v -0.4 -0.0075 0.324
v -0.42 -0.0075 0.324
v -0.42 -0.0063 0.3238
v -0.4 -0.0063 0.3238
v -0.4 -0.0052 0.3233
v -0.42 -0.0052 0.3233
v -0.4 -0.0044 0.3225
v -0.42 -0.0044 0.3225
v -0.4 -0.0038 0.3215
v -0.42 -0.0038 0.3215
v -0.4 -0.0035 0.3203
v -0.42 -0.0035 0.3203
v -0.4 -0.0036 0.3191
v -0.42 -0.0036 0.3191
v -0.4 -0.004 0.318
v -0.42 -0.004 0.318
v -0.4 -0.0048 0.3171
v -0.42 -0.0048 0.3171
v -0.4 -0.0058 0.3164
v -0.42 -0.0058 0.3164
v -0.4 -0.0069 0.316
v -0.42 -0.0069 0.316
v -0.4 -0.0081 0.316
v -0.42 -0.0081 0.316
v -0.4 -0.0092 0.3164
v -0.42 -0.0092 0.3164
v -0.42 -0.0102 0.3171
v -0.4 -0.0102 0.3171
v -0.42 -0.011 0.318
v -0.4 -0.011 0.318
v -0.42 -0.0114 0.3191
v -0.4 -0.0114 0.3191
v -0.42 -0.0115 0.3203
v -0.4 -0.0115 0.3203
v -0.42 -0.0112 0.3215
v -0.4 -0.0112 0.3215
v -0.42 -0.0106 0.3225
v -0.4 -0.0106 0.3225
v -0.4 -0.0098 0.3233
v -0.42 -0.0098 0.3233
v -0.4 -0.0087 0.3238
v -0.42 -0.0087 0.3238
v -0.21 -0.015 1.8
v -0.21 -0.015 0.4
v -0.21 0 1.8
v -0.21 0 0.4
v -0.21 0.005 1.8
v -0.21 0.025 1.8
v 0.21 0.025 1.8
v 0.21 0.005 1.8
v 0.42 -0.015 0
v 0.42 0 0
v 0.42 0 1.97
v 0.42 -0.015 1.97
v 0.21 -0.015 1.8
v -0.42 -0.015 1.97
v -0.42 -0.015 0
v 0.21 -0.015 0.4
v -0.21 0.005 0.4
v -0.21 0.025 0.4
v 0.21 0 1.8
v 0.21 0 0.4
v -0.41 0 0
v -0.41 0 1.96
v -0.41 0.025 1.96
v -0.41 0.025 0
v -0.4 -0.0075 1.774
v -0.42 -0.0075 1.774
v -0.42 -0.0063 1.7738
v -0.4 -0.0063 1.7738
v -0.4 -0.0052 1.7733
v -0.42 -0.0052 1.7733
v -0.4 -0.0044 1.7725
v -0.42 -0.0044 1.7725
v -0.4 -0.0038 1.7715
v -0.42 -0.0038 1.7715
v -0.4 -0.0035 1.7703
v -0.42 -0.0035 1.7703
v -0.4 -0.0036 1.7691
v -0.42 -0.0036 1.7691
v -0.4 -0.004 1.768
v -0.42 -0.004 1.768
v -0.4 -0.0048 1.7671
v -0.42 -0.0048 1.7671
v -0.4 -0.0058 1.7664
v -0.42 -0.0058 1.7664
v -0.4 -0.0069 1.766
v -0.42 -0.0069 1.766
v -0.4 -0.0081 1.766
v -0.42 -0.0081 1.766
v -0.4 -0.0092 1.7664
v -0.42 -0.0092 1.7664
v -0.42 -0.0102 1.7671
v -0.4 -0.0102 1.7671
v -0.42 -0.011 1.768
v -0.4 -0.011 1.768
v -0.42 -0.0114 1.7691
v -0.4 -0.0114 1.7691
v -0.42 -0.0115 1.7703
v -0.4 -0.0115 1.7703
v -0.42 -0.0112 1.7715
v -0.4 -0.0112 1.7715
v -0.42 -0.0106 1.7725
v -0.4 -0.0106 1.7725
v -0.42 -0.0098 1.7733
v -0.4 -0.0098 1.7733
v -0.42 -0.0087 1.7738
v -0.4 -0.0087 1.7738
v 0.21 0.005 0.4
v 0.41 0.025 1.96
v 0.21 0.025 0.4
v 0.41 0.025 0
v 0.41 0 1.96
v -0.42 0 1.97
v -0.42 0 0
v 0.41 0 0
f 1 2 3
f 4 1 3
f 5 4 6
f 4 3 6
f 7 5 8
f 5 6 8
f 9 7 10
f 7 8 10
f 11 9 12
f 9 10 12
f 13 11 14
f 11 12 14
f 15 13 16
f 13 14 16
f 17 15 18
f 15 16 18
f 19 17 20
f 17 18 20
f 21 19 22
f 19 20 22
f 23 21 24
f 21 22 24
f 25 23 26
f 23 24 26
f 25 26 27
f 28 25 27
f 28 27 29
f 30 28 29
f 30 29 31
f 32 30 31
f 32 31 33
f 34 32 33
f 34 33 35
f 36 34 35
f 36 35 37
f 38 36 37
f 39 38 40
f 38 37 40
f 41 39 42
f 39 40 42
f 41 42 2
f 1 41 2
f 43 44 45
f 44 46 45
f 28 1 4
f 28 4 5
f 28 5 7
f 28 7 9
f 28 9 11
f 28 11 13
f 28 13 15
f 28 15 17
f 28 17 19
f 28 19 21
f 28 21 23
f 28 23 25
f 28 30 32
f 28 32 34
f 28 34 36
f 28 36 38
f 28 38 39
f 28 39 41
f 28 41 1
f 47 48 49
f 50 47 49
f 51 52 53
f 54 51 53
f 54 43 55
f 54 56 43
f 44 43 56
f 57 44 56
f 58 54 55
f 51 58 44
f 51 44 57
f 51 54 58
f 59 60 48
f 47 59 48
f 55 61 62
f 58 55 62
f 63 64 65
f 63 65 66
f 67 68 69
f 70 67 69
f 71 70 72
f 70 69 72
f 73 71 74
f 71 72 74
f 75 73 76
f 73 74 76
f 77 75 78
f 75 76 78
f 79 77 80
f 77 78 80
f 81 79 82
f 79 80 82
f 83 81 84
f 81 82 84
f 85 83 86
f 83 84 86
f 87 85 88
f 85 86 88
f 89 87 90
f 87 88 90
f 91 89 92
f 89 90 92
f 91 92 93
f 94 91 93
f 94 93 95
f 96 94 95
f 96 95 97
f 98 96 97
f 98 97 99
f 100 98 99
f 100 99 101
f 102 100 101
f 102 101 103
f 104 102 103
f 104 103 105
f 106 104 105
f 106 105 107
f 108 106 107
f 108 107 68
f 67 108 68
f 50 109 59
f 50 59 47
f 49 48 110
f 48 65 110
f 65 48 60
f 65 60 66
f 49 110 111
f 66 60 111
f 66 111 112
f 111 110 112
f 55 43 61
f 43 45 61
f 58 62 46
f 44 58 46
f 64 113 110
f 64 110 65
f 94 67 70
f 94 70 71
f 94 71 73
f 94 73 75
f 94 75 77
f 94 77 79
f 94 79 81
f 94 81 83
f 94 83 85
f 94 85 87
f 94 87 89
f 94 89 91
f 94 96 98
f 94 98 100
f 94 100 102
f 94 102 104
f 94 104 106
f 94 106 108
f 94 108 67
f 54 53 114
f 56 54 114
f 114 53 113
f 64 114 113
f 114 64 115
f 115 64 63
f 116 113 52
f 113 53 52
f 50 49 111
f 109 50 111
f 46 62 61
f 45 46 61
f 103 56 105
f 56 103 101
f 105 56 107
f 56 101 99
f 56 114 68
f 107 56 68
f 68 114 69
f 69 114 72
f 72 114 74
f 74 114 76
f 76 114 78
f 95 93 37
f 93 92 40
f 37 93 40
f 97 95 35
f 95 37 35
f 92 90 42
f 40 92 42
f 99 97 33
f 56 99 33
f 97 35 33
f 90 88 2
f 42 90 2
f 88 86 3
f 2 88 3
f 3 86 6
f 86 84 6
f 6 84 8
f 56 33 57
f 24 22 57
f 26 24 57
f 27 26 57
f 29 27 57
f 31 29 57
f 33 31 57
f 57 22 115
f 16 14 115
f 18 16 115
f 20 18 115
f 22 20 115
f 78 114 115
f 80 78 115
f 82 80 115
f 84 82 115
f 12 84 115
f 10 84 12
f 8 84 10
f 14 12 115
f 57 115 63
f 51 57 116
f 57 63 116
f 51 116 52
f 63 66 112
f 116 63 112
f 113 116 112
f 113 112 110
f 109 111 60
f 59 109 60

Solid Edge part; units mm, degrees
sketch "Sketch1" plane through (0, 0, 0) normal (0, -1, 0) x (1, 0, 0)
  line L0 (-0.41, 0) -> (0.41, 0)
  line L1 (0.41, 0) -> (0.41, 1.96)
  line L2 (0.41, 1.96) -> (-0.41, 1.96)
  line L3 (-0.41, 1.96) -> (-0.41, 0)
  dimension "D1" = 1.96
  dimension "D2" = 0.82
extrude "Protrusion1" add sketch "Sketch1" against normal blind 0.025
sketch "Sketch2" plane through (0, 0, 0.98) normal (0, -1, 0) x (1, 0, 0)
  line L0 (-0.42, -0.98) -> (0.42, -0.98)
  line L1 (0.42, -0.98) -> (0.42, 0.99)
  line L2 (0.42, 0.99) -> (-0.42, 0.99)
  line L3 (-0.42, 0.99) -> (-0.42, -0.98)
extrude "Ausprägung_2" add sketch "Sketch2" along normal blind 0.015
sketch "Sketch3" plane through (-0.42, -0.0075, 0.985) normal (-1, 0, 0) x (0, 0, 1)
  circle A0 centre (0.785, 0) radius 0.004
  circle A1 centre (-0.665, 0) radius 0.004
  dimension "D1" = 0.008
  dimension "D2" = 0.32
  dimension "D3" = 0.0075
  dimension "D4" = 1.45
extrude "Ausschnitt_1" cut sketch "Sketch3" against normal blind 0.02
sketch "Sketch4" plane through (0, 0.025, 0.98) normal (0, 1, 0) x (-1, 0, 0)
  line L0 (-0.21, -0.58) -> (0.21, -0.58)
  line L1 (0.21, -0.58) -> (0.21, 0.82)
  line L2 (0.21, 0.82) -> (-0.21, 0.82)
  line L3 (-0.21, 0.82) -> (-0.21, -0.58)
  dimension "D1" = 0.42
  dimension "D2" = 1.4
  dimension "D3" = 0.4
extrude "Cutout1" cut sketch "Sketch4" against normal through all
sketch "Sketch5" plane through (0, 0.005, 0.98) normal (0, 1, 0) x (-1, 0, 0)
  line L0 (0.21, 0.82) -> (-0.21, 0.82)
  line L1 (-0.21, 0.82) -> (-0.21, -0.58)
  line L2 (-0.21, -0.58) -> (0.21, -0.58)
  line L3 (0.21, -0.58) -> (0.21, 0.82)
extrude "Ausprägung_3" add sketch "Sketch5" against normal blind 0.005
